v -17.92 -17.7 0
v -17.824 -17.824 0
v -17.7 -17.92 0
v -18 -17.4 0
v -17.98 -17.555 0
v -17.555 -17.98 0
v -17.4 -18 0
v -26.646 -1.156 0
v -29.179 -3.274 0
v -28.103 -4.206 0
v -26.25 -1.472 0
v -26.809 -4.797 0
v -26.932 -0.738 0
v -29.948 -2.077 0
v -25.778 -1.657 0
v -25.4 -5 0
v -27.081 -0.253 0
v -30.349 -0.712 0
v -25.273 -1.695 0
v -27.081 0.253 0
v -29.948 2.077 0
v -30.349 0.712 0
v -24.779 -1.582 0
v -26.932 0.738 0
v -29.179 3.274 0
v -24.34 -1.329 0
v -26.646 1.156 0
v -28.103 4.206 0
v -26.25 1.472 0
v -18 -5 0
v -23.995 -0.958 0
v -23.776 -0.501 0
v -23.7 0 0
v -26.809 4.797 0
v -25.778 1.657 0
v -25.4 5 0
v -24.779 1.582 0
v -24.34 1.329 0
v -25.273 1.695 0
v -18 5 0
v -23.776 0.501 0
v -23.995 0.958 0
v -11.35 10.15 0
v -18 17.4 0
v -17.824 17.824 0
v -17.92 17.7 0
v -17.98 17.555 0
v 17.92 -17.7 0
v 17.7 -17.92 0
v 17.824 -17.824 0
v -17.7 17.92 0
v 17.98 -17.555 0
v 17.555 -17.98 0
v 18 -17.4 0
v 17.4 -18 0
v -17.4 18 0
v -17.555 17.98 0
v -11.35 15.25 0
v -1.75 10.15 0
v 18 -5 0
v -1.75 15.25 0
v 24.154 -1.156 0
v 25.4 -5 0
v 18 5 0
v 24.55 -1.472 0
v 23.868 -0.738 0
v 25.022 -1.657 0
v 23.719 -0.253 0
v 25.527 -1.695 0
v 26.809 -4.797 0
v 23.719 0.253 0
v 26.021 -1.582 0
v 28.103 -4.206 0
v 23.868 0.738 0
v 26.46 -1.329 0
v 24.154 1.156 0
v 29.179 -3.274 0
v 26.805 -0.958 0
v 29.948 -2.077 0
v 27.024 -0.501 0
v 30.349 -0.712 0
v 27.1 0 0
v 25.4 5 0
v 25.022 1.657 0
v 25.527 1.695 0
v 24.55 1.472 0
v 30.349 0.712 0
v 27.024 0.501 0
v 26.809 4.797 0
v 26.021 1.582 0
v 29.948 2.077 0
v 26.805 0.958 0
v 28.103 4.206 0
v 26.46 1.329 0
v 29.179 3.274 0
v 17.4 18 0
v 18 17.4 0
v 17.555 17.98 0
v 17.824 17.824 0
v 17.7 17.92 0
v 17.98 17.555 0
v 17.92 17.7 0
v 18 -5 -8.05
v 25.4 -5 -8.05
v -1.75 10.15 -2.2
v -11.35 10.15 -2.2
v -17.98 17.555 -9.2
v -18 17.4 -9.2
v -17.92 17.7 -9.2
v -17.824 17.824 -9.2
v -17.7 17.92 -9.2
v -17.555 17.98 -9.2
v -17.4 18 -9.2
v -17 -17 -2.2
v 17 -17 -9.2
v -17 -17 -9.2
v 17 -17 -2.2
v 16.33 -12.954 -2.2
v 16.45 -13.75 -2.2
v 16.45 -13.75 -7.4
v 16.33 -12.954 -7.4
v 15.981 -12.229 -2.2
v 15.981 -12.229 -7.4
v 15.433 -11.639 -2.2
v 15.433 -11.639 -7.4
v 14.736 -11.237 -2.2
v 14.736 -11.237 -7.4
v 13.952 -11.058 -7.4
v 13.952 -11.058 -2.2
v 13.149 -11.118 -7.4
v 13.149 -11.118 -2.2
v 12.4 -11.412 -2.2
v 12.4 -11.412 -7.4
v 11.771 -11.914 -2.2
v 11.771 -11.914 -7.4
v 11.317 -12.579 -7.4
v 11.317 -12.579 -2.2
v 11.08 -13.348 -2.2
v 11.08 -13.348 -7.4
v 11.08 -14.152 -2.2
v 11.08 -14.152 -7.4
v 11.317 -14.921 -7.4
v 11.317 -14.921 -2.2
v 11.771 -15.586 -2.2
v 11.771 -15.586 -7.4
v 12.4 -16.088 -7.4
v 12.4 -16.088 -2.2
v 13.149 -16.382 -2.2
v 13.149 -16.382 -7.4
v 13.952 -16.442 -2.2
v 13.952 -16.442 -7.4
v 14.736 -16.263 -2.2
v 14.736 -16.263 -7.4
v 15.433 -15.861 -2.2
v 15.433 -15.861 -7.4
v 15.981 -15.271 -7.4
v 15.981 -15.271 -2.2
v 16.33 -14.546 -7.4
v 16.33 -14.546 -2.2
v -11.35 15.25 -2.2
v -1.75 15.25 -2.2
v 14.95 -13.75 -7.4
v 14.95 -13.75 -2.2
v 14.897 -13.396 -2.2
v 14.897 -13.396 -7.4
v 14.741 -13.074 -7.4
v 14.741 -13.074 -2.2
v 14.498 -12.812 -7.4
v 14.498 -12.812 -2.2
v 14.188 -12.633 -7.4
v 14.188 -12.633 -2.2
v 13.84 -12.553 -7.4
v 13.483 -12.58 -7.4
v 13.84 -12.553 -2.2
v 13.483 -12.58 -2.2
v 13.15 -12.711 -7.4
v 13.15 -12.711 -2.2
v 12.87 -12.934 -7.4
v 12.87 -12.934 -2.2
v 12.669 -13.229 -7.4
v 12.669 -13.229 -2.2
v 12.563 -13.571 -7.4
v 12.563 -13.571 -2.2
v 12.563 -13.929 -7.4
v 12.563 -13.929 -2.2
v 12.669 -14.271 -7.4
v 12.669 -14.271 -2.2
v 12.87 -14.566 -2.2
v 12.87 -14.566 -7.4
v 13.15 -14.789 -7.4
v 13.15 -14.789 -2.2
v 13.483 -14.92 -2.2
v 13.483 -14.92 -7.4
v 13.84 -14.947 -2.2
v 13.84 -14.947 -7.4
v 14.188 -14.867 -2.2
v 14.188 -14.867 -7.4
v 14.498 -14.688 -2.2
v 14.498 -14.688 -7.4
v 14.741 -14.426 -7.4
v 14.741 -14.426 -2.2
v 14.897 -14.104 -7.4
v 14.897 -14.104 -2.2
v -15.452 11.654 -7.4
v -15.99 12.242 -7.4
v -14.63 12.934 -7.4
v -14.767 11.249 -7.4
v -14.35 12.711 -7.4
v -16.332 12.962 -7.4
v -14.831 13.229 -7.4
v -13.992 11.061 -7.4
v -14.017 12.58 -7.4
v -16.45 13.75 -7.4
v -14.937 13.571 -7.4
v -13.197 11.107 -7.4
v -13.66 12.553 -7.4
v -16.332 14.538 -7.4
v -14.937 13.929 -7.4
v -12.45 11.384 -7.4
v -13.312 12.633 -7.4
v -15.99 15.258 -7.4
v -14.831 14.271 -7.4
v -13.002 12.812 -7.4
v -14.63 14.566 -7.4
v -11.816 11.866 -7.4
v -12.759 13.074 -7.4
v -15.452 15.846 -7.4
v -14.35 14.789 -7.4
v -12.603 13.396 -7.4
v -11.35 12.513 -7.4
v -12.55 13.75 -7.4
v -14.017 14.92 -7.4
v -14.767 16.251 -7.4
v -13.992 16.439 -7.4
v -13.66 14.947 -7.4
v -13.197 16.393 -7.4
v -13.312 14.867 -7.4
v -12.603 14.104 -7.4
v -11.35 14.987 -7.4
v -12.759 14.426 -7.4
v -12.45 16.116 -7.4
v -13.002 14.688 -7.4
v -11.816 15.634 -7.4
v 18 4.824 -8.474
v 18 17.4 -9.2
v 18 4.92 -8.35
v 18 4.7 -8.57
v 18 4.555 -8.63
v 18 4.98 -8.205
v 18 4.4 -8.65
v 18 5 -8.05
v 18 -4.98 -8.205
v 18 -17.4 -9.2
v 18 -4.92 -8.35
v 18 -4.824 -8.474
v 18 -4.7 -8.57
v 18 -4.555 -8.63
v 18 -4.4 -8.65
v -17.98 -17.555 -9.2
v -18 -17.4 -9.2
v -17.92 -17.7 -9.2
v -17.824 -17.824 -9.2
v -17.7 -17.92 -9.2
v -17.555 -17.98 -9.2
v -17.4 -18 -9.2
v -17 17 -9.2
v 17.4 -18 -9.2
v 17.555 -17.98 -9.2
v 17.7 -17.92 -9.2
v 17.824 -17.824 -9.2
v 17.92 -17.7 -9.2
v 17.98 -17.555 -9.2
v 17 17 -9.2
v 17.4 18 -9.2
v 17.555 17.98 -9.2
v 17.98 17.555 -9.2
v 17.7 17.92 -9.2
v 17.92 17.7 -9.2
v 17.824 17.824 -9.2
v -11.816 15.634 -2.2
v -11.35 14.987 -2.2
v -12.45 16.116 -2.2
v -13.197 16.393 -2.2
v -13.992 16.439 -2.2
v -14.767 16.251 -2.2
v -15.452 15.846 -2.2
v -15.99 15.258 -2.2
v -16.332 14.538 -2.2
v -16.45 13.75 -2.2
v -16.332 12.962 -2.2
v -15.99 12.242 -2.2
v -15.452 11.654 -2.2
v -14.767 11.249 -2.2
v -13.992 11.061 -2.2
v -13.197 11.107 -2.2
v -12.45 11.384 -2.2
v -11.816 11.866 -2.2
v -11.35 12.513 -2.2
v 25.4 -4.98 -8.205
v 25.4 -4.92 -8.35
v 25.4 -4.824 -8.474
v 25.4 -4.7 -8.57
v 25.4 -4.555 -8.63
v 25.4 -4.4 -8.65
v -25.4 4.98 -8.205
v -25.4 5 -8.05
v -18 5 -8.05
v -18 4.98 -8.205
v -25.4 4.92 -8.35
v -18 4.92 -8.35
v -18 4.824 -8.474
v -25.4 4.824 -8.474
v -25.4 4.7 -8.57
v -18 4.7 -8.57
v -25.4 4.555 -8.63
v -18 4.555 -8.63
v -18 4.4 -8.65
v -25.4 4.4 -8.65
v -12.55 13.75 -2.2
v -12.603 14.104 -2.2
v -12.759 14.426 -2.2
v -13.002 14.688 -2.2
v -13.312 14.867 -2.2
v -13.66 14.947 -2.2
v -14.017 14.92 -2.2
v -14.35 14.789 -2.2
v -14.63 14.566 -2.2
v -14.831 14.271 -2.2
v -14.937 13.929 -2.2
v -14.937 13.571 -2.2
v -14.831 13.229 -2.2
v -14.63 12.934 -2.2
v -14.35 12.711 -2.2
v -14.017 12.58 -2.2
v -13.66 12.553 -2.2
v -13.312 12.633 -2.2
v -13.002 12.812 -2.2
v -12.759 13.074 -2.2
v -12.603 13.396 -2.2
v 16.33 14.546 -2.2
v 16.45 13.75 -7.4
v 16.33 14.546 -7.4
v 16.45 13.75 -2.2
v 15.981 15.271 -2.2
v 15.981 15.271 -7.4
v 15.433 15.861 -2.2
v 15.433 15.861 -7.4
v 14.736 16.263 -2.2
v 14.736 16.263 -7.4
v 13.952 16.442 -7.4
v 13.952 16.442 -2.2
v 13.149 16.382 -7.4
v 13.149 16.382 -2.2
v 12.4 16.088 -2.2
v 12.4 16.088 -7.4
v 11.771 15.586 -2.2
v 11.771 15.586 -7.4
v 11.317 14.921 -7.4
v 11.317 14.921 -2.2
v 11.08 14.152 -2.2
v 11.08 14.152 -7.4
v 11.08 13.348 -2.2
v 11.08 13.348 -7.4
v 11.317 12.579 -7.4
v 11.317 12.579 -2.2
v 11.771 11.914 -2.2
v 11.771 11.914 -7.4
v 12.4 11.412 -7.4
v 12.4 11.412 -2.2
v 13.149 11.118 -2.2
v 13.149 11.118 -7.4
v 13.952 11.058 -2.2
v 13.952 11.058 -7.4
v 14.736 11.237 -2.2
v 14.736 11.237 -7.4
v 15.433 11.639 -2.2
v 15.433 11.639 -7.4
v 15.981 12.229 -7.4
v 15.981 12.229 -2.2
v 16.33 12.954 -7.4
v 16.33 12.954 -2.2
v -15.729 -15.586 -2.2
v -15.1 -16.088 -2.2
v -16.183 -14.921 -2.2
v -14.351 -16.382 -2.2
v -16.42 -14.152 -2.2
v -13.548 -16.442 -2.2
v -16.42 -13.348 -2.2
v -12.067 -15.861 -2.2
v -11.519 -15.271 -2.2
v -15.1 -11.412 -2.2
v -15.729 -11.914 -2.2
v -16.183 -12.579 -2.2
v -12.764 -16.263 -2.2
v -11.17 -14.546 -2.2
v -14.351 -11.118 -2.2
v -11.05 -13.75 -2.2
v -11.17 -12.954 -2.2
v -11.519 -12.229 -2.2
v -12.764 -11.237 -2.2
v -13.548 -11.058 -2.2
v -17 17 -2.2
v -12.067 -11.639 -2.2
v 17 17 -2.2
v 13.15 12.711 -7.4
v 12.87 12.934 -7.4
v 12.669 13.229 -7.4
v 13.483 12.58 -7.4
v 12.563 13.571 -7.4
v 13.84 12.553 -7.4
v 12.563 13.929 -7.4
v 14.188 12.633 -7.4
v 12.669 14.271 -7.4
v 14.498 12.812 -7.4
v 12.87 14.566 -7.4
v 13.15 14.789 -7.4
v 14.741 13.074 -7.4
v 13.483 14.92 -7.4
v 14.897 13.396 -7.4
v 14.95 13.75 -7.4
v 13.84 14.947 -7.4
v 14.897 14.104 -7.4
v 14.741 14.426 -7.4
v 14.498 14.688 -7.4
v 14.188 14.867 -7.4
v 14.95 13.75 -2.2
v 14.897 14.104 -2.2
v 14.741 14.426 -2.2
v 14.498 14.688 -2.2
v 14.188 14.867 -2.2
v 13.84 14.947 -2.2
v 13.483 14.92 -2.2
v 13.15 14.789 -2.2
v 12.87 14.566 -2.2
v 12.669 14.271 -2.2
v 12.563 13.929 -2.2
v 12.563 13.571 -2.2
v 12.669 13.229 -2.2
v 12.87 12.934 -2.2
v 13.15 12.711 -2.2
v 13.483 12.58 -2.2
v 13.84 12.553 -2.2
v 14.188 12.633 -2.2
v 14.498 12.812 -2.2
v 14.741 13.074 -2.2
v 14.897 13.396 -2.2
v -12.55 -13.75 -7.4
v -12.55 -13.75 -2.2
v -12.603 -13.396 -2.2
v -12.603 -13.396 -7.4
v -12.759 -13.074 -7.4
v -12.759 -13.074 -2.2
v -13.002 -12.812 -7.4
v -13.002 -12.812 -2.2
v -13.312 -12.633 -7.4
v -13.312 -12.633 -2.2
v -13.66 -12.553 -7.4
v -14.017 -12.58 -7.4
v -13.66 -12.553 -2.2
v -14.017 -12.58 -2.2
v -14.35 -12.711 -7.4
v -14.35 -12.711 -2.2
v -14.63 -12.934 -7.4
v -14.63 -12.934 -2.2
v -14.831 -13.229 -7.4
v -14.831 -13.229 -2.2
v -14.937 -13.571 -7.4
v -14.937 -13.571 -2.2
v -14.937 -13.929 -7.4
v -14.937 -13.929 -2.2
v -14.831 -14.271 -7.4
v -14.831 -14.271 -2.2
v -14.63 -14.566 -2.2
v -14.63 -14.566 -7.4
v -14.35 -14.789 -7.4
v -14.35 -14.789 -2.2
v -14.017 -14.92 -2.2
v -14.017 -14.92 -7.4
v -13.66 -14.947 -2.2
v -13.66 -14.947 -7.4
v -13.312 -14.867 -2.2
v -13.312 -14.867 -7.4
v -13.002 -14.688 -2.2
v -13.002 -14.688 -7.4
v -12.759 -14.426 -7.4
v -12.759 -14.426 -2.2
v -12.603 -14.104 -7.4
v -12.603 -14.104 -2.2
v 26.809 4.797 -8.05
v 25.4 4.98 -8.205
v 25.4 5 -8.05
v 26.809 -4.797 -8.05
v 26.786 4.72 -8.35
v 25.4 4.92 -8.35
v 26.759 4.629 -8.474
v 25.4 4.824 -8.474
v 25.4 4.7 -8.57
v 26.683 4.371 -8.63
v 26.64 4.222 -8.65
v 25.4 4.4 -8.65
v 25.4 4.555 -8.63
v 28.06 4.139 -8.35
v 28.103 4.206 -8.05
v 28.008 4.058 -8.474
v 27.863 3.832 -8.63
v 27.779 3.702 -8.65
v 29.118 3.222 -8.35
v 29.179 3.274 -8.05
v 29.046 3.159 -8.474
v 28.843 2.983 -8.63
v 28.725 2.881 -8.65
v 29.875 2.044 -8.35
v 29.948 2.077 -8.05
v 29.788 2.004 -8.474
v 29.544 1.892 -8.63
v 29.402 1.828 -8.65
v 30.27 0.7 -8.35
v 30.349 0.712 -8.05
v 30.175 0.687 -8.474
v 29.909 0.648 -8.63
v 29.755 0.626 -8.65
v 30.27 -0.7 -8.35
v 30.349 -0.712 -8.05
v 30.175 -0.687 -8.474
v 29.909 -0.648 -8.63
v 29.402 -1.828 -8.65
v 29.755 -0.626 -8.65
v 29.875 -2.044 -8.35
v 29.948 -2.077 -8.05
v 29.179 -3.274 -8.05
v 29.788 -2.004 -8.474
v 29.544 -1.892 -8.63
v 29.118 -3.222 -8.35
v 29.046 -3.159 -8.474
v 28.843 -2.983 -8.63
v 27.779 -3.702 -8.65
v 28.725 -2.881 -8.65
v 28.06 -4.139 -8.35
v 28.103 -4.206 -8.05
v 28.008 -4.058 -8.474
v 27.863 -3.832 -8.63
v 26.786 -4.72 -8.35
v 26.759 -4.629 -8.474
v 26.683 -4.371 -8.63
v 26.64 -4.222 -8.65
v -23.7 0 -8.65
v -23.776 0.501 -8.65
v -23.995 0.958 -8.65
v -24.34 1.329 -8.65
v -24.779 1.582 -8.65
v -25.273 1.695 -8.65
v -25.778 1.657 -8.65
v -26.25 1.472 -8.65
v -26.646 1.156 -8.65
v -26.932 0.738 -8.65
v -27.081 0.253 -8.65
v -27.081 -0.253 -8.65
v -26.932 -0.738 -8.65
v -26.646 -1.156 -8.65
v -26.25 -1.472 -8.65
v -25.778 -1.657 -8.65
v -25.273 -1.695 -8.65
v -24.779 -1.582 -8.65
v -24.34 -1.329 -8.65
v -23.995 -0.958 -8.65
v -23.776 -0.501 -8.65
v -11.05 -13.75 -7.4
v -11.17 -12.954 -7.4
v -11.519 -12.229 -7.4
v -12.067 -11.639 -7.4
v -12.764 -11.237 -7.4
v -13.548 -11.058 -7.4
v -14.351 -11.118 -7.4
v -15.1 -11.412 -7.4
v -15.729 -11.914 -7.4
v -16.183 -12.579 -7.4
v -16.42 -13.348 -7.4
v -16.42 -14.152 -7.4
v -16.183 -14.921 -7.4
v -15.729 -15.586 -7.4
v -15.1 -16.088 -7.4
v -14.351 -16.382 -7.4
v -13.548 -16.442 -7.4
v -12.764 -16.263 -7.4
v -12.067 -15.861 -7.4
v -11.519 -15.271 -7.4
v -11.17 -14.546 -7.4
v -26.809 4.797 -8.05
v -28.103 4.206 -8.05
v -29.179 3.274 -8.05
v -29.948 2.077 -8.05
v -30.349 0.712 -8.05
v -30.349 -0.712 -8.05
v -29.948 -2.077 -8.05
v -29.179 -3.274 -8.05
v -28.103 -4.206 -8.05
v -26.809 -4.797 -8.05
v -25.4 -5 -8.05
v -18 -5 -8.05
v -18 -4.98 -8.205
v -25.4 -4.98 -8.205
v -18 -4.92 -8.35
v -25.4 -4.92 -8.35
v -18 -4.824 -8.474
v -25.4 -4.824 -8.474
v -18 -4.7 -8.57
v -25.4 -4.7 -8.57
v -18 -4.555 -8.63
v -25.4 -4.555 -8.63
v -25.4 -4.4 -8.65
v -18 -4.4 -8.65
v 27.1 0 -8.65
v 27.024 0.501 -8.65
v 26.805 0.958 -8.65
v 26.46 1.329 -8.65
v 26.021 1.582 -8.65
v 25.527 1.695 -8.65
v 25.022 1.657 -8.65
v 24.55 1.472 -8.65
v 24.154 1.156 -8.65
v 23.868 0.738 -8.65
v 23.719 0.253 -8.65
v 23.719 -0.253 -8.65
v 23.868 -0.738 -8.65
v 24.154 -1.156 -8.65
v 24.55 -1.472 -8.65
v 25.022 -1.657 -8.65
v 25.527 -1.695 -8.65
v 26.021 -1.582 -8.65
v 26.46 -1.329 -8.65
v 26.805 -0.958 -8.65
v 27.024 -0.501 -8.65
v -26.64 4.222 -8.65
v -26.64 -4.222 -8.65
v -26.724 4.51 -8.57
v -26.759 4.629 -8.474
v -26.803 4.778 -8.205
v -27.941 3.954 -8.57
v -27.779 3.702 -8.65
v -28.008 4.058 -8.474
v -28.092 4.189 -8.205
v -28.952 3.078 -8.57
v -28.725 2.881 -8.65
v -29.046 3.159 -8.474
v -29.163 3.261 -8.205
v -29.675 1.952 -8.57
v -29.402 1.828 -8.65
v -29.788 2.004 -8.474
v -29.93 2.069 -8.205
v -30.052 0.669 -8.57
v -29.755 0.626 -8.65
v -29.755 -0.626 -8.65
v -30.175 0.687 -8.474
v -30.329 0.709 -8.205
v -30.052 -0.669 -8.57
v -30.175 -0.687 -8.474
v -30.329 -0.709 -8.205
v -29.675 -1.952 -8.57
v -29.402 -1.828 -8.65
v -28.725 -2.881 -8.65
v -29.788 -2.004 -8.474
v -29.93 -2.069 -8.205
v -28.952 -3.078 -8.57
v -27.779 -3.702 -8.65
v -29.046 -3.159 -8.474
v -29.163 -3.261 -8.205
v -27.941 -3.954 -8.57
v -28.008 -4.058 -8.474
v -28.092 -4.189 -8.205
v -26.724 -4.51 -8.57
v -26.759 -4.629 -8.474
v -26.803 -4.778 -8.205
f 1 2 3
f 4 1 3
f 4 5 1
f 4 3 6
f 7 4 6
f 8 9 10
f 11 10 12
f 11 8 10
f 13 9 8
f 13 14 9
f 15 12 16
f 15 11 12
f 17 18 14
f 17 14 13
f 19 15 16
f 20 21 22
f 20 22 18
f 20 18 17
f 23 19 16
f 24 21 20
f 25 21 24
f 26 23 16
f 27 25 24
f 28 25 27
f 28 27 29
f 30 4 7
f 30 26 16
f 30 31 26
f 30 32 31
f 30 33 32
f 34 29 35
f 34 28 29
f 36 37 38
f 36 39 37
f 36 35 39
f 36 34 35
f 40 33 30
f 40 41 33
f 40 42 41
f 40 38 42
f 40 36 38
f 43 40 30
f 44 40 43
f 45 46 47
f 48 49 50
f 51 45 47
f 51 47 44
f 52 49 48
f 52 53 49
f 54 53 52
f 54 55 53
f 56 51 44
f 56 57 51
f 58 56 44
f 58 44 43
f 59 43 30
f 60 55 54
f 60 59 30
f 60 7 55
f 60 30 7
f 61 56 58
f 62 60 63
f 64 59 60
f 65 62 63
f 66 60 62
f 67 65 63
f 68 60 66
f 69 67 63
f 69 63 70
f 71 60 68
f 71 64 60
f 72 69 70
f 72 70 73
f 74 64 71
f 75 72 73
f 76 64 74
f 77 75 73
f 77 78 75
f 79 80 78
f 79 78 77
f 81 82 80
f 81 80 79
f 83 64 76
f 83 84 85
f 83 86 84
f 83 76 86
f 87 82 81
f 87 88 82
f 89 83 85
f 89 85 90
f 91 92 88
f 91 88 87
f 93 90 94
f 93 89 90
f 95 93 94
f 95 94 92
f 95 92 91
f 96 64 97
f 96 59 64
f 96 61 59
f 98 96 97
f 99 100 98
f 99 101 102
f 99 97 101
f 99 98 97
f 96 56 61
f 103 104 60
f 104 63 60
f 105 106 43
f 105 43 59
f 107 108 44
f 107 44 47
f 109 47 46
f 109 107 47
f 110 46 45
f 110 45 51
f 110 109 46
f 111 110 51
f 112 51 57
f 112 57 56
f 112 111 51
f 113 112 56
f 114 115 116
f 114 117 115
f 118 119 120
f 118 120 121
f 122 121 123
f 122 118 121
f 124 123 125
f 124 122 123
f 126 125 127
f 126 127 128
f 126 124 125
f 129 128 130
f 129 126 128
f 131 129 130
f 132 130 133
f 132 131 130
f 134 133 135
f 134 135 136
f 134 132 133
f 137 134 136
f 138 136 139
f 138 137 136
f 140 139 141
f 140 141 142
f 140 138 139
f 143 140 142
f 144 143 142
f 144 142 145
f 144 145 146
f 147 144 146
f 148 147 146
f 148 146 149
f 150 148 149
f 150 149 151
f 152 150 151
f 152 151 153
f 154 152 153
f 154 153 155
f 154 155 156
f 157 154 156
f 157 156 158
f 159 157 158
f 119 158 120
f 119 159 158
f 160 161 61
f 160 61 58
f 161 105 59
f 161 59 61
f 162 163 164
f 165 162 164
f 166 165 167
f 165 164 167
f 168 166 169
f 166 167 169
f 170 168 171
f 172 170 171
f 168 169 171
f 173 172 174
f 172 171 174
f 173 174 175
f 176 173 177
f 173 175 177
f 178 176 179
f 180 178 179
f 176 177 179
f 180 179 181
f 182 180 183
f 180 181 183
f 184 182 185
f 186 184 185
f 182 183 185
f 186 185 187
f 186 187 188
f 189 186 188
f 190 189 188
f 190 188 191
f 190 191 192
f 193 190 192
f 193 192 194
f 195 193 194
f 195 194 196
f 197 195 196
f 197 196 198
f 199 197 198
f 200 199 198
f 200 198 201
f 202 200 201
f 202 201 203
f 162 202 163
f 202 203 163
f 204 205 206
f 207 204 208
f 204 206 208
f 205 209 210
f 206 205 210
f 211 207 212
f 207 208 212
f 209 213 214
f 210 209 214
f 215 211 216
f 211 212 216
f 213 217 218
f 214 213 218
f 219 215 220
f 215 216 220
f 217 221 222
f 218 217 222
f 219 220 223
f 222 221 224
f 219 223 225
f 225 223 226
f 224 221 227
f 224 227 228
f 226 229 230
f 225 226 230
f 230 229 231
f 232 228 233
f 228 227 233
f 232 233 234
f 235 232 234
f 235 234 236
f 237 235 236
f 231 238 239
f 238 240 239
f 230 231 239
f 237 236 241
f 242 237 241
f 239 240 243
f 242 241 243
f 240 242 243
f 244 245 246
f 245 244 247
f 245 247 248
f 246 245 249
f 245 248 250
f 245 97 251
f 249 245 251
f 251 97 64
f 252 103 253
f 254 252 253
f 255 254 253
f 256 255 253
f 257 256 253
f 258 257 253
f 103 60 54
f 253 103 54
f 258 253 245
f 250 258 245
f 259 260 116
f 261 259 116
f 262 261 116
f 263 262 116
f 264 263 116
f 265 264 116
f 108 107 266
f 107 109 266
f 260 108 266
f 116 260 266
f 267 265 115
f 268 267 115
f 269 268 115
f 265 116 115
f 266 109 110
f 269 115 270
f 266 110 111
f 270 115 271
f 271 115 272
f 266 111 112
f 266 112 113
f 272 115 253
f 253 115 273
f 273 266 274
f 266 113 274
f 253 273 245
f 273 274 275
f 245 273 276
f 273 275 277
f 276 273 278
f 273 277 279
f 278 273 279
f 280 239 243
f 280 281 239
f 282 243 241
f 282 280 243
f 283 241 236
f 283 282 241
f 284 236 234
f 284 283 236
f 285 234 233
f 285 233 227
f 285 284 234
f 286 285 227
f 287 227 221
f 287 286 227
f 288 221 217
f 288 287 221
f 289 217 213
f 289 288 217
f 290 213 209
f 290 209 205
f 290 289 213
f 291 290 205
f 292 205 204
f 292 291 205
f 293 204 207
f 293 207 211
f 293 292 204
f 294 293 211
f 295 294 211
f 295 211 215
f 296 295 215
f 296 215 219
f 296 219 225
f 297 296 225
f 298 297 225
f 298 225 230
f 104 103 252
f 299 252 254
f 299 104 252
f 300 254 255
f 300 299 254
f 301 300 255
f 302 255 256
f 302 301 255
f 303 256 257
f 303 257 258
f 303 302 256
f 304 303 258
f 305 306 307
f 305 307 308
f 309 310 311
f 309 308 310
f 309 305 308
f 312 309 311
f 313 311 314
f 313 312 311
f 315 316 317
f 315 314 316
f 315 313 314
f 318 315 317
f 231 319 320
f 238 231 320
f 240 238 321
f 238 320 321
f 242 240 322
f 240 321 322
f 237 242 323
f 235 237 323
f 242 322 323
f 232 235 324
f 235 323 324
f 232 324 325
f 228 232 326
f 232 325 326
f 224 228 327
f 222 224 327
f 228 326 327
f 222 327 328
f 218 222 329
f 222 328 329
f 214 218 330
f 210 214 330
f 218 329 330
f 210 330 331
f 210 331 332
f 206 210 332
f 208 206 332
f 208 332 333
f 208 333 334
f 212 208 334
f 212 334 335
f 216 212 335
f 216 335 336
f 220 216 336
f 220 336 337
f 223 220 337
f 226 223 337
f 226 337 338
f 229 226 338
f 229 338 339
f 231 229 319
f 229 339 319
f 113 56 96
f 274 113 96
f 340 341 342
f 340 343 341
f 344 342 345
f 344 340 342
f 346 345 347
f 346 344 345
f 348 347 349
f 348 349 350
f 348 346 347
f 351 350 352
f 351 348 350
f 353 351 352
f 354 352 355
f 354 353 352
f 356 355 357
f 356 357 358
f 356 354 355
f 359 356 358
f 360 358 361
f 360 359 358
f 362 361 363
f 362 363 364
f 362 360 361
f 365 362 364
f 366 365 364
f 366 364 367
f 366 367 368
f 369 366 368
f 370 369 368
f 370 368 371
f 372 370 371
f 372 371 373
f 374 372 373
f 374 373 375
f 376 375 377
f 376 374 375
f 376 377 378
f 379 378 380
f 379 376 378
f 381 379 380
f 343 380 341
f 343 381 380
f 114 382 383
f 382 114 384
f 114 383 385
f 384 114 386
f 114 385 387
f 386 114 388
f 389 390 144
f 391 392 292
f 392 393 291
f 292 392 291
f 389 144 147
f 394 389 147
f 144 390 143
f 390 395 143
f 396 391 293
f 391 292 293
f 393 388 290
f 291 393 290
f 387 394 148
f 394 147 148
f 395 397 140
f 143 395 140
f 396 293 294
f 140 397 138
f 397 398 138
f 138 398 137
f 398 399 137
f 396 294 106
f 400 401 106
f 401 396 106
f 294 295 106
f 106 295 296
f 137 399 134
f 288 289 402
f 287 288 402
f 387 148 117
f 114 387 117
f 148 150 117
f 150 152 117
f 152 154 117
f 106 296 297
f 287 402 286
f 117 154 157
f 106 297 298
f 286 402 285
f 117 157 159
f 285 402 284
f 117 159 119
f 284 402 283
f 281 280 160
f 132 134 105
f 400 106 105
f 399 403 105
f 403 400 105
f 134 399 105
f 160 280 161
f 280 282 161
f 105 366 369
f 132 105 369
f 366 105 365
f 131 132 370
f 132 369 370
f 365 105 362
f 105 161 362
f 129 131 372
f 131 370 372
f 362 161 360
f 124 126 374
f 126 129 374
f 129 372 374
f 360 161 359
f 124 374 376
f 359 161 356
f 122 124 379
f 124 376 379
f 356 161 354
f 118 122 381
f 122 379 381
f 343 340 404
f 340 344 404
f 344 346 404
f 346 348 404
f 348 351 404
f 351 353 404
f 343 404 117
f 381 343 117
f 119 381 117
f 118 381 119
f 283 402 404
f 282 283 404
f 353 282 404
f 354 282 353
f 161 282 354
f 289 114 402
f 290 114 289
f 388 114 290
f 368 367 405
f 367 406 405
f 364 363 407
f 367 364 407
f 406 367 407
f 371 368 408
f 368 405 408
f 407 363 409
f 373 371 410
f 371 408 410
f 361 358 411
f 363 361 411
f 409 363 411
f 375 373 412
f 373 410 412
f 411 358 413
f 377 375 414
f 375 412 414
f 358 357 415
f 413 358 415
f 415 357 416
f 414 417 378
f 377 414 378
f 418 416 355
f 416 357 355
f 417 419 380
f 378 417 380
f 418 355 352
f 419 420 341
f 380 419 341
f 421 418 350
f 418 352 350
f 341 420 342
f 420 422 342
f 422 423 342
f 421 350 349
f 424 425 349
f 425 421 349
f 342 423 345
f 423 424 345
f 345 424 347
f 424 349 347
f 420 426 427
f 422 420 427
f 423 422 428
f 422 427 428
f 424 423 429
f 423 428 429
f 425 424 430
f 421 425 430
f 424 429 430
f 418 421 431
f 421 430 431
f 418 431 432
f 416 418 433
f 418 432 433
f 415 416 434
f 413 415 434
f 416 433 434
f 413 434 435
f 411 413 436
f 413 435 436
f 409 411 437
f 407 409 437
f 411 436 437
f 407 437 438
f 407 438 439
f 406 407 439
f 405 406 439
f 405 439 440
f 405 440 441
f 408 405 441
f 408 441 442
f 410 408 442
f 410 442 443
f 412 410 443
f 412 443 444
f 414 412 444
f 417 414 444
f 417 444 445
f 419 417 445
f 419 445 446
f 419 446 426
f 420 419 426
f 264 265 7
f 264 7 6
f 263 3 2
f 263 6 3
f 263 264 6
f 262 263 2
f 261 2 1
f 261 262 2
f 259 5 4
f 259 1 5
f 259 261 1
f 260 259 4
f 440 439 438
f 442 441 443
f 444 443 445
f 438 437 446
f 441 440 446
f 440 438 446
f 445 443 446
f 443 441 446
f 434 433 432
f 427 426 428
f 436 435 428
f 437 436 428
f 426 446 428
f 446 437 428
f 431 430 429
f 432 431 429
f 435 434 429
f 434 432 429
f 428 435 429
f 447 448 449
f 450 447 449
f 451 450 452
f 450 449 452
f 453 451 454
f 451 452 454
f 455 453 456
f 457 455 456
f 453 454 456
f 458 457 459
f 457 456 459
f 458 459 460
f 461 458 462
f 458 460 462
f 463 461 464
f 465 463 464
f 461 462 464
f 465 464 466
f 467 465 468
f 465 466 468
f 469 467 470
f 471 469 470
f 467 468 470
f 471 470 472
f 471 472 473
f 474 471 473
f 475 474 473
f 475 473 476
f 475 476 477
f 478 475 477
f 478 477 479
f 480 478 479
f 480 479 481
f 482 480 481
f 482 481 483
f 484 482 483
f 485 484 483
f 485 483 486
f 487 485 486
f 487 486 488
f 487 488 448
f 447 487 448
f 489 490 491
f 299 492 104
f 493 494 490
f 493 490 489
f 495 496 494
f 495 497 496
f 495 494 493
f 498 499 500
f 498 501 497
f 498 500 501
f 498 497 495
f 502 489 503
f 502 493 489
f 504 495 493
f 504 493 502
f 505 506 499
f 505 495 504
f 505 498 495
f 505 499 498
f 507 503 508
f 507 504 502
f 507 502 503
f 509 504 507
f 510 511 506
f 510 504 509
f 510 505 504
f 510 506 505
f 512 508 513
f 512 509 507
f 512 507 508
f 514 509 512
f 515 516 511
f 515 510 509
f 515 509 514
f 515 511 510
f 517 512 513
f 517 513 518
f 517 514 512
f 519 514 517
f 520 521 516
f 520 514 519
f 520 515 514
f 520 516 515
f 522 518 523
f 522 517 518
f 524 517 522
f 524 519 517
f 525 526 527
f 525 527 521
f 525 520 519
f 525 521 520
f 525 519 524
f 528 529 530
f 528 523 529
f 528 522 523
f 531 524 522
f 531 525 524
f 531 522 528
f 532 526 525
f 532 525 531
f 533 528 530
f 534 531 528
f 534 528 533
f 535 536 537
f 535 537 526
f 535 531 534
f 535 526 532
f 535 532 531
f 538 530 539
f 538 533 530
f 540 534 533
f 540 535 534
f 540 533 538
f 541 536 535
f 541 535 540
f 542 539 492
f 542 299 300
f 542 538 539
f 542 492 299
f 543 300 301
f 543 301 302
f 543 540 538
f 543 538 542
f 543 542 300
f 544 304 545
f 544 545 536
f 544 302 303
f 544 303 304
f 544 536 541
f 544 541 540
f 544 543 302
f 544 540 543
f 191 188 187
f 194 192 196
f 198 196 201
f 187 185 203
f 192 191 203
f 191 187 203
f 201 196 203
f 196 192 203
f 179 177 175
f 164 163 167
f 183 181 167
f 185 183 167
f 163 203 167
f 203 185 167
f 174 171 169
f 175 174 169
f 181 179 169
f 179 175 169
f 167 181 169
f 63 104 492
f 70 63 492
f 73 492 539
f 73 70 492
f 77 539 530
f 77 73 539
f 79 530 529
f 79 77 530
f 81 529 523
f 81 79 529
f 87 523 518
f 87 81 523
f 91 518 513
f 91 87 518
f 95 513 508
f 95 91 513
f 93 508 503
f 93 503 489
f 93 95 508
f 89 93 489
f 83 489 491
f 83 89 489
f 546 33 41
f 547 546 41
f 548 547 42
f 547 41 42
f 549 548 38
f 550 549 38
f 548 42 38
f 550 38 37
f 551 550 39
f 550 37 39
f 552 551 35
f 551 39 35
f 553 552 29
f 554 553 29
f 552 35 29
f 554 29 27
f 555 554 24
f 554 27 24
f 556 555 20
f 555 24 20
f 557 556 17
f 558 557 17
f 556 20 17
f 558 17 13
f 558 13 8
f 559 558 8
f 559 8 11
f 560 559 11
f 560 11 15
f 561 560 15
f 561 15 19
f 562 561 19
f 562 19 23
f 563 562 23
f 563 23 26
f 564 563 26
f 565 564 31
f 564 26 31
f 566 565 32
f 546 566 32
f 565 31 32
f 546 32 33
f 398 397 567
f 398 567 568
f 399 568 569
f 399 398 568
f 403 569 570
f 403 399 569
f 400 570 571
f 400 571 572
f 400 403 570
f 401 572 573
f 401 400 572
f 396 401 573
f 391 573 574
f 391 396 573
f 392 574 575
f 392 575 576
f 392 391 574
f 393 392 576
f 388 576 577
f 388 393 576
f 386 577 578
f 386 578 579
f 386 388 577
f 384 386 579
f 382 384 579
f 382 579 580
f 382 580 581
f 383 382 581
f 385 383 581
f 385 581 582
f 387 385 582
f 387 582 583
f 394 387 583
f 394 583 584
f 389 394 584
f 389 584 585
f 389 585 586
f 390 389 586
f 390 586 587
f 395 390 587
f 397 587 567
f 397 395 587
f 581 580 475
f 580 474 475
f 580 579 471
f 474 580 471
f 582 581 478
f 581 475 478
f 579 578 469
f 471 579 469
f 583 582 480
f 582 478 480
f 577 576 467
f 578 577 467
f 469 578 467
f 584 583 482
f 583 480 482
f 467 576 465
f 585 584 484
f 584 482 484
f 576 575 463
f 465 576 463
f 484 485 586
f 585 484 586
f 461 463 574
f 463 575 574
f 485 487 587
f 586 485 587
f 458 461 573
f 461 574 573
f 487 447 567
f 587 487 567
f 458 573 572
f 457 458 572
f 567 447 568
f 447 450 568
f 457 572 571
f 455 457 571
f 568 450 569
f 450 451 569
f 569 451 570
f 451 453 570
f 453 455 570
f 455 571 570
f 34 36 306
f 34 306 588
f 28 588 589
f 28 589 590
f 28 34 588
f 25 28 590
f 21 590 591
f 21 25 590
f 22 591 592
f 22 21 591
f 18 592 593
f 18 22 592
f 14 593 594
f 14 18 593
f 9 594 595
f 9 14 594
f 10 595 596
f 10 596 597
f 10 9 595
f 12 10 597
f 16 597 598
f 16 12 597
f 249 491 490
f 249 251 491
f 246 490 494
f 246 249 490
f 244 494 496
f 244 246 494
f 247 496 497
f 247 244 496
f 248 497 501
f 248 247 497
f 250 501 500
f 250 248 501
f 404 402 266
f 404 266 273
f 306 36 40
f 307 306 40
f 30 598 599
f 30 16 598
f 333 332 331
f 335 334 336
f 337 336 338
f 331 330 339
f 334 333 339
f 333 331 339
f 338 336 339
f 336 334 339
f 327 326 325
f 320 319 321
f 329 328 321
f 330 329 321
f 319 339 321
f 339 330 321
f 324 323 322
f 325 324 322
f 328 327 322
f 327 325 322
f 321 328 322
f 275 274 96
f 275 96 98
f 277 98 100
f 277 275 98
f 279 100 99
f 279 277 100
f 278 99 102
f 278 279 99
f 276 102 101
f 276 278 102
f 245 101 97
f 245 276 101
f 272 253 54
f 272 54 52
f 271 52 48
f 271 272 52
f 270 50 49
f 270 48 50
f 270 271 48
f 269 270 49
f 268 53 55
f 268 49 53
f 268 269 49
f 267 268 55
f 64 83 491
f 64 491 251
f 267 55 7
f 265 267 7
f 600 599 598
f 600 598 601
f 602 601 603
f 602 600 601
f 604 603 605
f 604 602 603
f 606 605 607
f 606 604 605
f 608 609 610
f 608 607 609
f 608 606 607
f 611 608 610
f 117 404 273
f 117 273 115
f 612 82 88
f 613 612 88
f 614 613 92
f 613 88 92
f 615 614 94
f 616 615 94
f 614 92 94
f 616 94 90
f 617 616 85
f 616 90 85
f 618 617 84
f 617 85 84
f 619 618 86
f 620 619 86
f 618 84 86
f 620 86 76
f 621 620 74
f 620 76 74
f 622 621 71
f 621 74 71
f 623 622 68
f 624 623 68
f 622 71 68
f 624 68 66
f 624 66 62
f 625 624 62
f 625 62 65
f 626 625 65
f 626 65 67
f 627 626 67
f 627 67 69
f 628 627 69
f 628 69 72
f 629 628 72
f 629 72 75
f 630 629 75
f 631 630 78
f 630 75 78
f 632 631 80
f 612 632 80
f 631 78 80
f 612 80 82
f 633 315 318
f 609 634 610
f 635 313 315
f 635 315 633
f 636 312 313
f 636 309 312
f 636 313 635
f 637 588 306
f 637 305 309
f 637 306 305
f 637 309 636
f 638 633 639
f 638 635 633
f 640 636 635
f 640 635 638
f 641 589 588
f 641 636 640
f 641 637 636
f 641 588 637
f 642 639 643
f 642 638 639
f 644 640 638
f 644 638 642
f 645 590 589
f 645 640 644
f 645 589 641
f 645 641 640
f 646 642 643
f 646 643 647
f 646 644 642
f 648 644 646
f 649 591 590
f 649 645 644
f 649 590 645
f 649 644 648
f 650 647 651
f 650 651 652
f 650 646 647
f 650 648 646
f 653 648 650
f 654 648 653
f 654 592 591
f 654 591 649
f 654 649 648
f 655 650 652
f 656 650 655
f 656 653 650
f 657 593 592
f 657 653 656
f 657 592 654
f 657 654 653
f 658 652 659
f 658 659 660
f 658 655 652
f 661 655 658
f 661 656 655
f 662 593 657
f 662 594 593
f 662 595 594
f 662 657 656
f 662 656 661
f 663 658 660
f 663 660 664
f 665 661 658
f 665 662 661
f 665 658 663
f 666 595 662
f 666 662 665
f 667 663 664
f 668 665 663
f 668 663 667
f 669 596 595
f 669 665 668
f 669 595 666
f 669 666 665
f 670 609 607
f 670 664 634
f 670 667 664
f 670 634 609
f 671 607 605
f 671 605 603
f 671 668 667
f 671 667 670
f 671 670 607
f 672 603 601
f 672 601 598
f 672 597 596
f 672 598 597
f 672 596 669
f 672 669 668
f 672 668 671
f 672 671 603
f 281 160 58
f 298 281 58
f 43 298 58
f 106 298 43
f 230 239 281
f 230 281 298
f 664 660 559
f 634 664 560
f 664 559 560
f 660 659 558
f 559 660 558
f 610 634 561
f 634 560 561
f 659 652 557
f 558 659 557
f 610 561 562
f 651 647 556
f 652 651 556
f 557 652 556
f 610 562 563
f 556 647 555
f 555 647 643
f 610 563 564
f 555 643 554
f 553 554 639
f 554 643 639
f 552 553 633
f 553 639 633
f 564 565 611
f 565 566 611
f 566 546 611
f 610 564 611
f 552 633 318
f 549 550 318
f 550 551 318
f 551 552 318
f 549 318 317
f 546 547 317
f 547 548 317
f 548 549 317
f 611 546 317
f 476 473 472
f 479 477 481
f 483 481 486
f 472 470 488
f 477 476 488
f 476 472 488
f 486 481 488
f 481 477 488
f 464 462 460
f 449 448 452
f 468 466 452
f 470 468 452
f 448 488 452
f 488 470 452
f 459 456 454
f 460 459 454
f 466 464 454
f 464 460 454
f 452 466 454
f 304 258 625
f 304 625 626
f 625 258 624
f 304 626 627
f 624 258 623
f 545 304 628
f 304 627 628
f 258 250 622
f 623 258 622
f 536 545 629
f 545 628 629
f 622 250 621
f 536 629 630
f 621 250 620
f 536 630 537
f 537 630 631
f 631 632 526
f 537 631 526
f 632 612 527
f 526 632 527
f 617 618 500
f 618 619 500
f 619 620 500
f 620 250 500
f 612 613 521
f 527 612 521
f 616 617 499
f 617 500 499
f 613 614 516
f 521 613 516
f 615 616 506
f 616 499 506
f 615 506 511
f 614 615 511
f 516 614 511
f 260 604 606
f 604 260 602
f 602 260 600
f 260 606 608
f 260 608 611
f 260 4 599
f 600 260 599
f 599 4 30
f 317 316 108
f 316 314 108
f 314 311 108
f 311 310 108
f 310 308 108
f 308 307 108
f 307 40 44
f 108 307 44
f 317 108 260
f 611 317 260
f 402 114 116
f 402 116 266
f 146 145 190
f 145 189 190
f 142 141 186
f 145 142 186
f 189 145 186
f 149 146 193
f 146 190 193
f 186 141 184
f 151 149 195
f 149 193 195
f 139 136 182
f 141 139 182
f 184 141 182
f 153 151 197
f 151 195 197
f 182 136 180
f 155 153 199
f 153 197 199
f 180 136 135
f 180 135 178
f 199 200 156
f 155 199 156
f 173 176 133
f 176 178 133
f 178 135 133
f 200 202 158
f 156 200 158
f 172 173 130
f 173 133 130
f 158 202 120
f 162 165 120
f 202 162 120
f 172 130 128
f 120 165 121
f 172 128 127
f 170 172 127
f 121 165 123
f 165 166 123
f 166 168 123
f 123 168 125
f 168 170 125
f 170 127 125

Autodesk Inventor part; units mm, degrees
ref_plane "YZ Plane" through (0, 0, 0) normal (1, 0, 0) x (0, 1, 0)
ref_plane "XZ Plane" through (0, 0, 0) normal (0, 1, 0) x (-1, 0, 0)
ref_plane "XY Plane" through (0, 0, 0) normal (0, 0, 1) x (1, 0, 0)
sketch "Sketch1" plane through (0, 0, 0) normal (0, 0, 1) x (1, 0, 0)
  circle A0 centre (0, 0) radius 25.4 construction
  line L0 (-13.75, -13.75) -> (13.75, -13.75) construction
  line L1 (13.75, -13.75) -> (13.75, 13.75) construction
  line L2 (13.75, 13.75) -> (-13.75, 13.75) construction
  line L3 (-13.75, 13.75) -> (-13.75, -13.75) construction
  line L4 (-13.75, -13.75) -> (13.75, 13.75) construction
  line L5 (13.75, -13.75) -> (-13.75, 13.75) construction
  circle A1 centre (0, 0) radius 7.25
  circle A2 centre (-13.75, 13.75) radius 1.2
  circle A3 centre (-13.75, 13.75) radius 2.7
  circle A4 centre (-25.4, 0) radius 1.7
  circle A5 centre (-25.4, 0) radius 5
  line L6 (-17, 17) -> (17, 17)
  line L7 (17, 17) -> (17, -17)
  line L8 (17, -17) -> (-17, -17)
  line L9 (-17, -17) -> (-17, 17)
  line L10 (-17, 17) -> (17, -17) construction
  line L11 (17, 17) -> (-17, -17) construction
  line L12 (-25.4, 5) -> (-18, 5)
  line L13 (-25.4, -5) -> (-18, -5)
  line L14 (0, 17) -> (0, -17) construction
  line L15 (-17, 0) -> (17, 0) construction
  circle A6 centre (25.4, 0) radius 1.7
  circle A7 centre (25.4, 0) radius 5
  line L16 (25.4, 5) -> (18, 5)
  line L17 (25.4, -5) -> (18, -5)
  circle A8 centre (13.75, 13.75) radius 1.2
  circle A9 centre (13.75, 13.75) radius 2.7
  circle A10 centre (-13.75, -13.75) radius 1.2
  circle A11 centre (-13.75, -13.75) radius 2.7
  circle A12 centre (13.75, -13.75) radius 2.7
  circle A13 centre (13.75, -13.75) radius 1.2
  line L18 (-18, 18) -> (18, 18)
  line L19 (18, 18) -> (18, -18)
  line L20 (18, -18) -> (-18, -18)
  line L21 (-18, -18) -> (-18, 18)
  line L22 (-18, 18) -> (18, -18) construction
  line L23 (18, 18) -> (-18, -18) construction
  circle A14 centre (-13.75, 13.75) radius 12 construction
  line L24 (-1.75, 13.75) -> (-1.75, 15.25) construction
  line L25 (-1.75, 13.75) -> (-1.75, 10.15) construction
  line L26 (-11.35, 13.75) -> (-11.35, 10.15) construction
  line L27 (-11.35, 13.75) -> (-11.35, 15.25) construction
  line L28 (-11.35, 10.15) -> (-1.75, 10.15)
  line L29 (-1.75, 10.15) -> (-1.75, 15.25)
  line L30 (-1.75, 15.25) -> (-11.35, 15.25)
  line L31 (-11.35, 15.25) -> (-11.35, 10.15)
  point P0 (-17, 3.8)
  point P1 (-17, -3.8)
  point P2 (17, 3.8)
  point P3 (17, -3.8)
  dimension "d22" = 24
  dimension "d0" = 50.8
  dimension "d1" = 27.5
  dimension "d2" = 27.5
  dimension "d3" = 14.5
  dimension "d4" = 2.4
  dimension "d5" = 5.4
  dimension "d6" = 3.4
  dimension "d7" = 10
  dimension "d8" = 34
  dimension "d9" = 34
  dimension "d10" = 36
  dimension "d11" = 36
  dimension "d24" = 1.5
  dimension "d25" = 3.6
extrude "Extrusion1" add sketch "Sketch1" against normal blind 9.2 contours L21 L18 L19 L20
extrude "Extrusion3" add sketch "Sketch1" against normal blind 7.4 contours A3 L31 | L31 A3 | A9 | A11 | A12
extrude "Extrusion4" add sketch "Sketch1" against normal blind 2.2 contours A1 | A2 | A3 L31 L30 L29 L28 | L6 L7 L8 L9 | A8 | A10 | A13
extrude "Extrusion5" add sketch "Sketch1" against normal blind 8.65 contours A5 | A5 L12 L21 L13 | L16 A7 L17 L19 | A7
extrude "Extrusion6" cut sketch "Sketch1" along normal mid plane 22 contours A3 L31 | A3 L31 L30 L29 L28 picked at (-11.2949, 13.4692)
fillet "Fillet1" radius 0.6 10 edges at (-18, -18, -4.6) (-18, 18, -4.6) (18, 18, -4.6) (18, -18, -4.6) (-30.4, 0, -8.65) (-21.7, 5, -8.65) (-21.7, -5, -8.65) (30.4, 0, -8.65) (21.7, 5, -8.65) (21.7, -5, -8.65)
equation "\"d9\" = d8"
properties part number "cameraBottom"
